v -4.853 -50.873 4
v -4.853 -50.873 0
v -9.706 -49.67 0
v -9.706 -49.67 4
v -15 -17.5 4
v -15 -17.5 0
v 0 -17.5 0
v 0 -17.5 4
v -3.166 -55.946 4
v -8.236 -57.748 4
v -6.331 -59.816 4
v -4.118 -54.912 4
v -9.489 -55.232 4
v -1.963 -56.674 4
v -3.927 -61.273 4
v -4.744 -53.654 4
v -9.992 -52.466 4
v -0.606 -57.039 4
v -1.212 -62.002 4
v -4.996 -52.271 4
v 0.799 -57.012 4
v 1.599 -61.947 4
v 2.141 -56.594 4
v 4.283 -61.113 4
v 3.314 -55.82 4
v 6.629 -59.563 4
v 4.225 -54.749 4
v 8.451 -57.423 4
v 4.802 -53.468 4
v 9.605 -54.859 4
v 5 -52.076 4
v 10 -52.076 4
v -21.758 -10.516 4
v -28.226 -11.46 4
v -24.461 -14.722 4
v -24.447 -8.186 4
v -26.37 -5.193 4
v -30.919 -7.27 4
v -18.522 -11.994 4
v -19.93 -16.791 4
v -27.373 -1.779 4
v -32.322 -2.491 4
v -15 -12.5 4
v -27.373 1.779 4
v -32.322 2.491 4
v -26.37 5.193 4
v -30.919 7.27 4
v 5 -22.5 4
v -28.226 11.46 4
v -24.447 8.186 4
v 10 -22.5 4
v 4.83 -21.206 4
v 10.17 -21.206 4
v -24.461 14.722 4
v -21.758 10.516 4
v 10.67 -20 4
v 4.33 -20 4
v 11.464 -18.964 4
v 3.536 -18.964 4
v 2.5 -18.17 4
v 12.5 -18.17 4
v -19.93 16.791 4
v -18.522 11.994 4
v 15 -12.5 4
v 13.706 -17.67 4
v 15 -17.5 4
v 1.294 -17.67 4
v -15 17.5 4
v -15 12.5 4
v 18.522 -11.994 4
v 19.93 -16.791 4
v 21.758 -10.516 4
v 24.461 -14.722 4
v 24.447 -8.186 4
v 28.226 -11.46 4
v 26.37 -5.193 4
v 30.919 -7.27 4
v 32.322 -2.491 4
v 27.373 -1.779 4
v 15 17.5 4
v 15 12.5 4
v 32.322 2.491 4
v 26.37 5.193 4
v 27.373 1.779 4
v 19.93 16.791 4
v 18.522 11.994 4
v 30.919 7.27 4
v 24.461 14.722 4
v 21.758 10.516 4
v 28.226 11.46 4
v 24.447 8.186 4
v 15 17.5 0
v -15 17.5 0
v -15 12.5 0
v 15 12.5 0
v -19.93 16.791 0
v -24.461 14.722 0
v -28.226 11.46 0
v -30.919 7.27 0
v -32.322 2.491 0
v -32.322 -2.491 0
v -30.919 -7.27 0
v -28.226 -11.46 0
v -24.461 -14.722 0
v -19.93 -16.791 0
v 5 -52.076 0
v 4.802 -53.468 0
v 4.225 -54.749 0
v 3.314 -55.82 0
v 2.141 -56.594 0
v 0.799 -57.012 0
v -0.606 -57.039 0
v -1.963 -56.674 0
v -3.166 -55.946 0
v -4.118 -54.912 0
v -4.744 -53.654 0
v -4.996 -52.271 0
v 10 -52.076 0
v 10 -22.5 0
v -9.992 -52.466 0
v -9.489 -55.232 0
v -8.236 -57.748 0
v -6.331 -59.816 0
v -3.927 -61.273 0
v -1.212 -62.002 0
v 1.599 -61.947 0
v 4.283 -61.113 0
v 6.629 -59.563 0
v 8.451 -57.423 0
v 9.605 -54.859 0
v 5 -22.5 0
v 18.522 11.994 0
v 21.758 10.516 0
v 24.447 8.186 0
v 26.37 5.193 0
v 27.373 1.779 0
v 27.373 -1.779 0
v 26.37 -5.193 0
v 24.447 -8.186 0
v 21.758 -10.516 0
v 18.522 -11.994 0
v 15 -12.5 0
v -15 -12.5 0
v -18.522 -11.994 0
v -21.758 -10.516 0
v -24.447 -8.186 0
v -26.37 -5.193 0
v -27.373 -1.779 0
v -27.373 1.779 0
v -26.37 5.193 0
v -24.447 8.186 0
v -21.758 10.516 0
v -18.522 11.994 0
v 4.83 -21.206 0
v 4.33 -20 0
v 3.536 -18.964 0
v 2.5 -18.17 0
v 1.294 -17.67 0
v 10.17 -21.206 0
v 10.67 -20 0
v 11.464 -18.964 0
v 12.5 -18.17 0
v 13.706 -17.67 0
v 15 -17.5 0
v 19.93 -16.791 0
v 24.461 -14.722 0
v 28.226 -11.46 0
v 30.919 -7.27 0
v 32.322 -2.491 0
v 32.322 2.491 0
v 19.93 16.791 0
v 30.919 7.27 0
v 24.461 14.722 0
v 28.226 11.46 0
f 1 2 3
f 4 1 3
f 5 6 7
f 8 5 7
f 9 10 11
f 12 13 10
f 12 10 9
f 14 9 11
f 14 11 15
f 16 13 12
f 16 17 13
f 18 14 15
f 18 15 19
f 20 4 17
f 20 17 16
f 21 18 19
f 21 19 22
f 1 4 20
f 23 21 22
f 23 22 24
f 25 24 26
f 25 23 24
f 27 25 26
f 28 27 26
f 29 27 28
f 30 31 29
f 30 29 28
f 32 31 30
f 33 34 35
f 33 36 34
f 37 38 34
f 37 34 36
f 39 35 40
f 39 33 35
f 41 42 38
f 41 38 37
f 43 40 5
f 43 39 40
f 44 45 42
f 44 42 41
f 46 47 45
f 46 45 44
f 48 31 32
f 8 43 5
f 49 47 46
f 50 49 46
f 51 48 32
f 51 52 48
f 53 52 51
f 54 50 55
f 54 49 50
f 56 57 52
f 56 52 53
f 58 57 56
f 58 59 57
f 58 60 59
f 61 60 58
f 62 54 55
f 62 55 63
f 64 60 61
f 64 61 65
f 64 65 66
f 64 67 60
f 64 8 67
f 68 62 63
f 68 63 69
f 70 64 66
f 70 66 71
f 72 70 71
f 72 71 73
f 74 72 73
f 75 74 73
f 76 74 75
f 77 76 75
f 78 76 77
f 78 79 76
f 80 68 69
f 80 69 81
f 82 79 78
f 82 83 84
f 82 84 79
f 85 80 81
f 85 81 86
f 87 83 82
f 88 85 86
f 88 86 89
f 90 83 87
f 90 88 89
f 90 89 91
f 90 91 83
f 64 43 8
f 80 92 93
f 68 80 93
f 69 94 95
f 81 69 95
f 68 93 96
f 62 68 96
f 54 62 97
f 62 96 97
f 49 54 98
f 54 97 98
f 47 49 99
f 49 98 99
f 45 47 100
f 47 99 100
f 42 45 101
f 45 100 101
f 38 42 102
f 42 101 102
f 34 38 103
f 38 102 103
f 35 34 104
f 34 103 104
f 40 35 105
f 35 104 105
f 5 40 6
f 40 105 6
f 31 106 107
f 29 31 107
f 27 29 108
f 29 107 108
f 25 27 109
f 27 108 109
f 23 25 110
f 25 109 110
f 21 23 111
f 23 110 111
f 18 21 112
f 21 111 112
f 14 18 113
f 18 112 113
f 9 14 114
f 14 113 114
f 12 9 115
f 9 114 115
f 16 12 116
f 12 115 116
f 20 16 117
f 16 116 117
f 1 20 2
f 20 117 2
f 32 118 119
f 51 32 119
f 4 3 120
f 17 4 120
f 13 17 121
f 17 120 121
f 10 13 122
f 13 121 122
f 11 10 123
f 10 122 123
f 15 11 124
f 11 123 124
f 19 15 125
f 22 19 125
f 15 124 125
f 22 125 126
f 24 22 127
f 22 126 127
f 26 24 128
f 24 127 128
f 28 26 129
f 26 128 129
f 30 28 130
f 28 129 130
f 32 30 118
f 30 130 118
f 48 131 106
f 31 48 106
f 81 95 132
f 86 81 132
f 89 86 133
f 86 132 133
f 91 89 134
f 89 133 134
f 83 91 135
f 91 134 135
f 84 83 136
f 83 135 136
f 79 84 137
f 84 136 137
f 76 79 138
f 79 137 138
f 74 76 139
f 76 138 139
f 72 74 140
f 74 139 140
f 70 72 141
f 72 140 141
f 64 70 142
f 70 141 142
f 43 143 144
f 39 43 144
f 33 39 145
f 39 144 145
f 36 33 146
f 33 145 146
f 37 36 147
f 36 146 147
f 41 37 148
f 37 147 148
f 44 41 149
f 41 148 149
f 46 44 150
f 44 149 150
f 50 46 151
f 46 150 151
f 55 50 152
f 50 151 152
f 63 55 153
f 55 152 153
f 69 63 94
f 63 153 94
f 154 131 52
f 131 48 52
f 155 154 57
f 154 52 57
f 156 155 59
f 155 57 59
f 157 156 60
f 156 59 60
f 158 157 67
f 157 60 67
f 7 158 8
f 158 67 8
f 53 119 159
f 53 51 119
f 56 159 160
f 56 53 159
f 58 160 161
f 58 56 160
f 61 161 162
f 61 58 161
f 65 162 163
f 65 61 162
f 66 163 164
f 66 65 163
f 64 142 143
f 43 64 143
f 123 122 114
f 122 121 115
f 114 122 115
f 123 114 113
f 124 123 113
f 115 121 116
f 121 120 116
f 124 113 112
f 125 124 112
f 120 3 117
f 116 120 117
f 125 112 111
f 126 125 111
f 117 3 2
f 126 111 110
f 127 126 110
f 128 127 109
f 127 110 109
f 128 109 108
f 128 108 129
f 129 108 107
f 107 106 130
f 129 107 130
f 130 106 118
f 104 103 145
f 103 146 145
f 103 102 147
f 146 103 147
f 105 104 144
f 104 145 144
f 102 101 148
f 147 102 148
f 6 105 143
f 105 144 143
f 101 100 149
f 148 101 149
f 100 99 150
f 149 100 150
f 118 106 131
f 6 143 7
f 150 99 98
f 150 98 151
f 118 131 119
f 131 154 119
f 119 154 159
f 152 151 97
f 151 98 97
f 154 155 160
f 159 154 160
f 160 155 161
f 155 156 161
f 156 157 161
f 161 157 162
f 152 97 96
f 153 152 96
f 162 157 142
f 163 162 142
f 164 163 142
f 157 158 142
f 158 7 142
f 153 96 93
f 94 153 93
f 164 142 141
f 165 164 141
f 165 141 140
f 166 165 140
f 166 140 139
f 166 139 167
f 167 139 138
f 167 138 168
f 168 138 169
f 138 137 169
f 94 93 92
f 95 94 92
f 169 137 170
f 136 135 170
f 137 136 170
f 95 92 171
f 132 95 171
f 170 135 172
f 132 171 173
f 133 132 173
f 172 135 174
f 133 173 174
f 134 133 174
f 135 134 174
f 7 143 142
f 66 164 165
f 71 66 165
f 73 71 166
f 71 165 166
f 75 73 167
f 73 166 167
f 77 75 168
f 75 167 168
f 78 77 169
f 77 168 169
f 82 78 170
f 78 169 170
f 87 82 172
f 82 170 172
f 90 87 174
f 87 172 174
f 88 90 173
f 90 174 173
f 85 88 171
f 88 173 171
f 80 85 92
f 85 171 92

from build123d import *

# Parameters (mm, degrees)
F1_DEPTH = 4
F2_R     = 4.99999


# Not quite as in the source:
# - a fillet or chamfer is up to 0.001 mm smaller than in the source, because OpenCascade refuses the exact size


with BuildPart() as f1:
    # F0 (on Top) → F1 (new body)
    with BuildSketch(Plane.XY):
        with BuildLine():
            ThreePointArc((5, -52.0760789514), (-0.6060621786, -57.039211897), (-4.8530754543, -50.8728920851))
            Line((-4.8530754543, -50.8728920851), (-9.7061509086, -49.6697052189))
            ThreePointArc((-9.7061509086, -49.6697052189), (-1.2121243571, -62.0023448426), (10, -52.0760789514))
            Line((10, -52.0760789514), (10, -20.8603814244))
            Line((10, -20.8603814244), (10, -17.5000000745))
            Line((10, -17.5000000745), (15, -17.5000000745))
            ThreePointArc((15, -17.5000000745), (32.5000000745, 0), (15, 17.5000000745))
            Line((15, 17.5000000745), (0, 17.5000000745))
            Line((0, 17.5000000745), (-15, 17.5000000745))
            ThreePointArc((-15, 17.5000000745), (-32.5000000745, 0), (-15, -17.5000000745))
            Line((-15, -17.5000000745), (0, -17.5000000745))
            Line((0, -17.5000000745), (5, -17.5000000745))
            Line((5, -17.5000000745), (5, -18.7957836315))
            Line((5, -18.7957836315), (5, -43.4158249135))
            Line((5, -43.4158249135), (5, -52.0760789514))
        make_face()
        with BuildLine():
            ThreePointArc((-15, -12.5), (-27.5, 0), (-15, 12.5))
            Line((-15, 12.5), (0, 12.5))
            Line((0, 12.5), (15, 12.5))
            ThreePointArc((15, 12.5), (27.5, 0), (15, -12.5))
            Line((15, -12.5), (0, -12.5))
            Line((0, -12.5), (-15, -12.5))
        make_face(mode=Mode.SUBTRACT)
    extrude(amount=F1_DEPTH)

    # F2 (radius 5 in the source; OpenCascade refuses exactly that, so slightly less here)
    f2_edges = [f1.edges().sort_by_distance(p)[0] for p in [
        (5, -17.5, 2),
        (10, -17.5, 2),
    ]]
    fillet(f2_edges, radius=F2_R)


solid = f1.part
